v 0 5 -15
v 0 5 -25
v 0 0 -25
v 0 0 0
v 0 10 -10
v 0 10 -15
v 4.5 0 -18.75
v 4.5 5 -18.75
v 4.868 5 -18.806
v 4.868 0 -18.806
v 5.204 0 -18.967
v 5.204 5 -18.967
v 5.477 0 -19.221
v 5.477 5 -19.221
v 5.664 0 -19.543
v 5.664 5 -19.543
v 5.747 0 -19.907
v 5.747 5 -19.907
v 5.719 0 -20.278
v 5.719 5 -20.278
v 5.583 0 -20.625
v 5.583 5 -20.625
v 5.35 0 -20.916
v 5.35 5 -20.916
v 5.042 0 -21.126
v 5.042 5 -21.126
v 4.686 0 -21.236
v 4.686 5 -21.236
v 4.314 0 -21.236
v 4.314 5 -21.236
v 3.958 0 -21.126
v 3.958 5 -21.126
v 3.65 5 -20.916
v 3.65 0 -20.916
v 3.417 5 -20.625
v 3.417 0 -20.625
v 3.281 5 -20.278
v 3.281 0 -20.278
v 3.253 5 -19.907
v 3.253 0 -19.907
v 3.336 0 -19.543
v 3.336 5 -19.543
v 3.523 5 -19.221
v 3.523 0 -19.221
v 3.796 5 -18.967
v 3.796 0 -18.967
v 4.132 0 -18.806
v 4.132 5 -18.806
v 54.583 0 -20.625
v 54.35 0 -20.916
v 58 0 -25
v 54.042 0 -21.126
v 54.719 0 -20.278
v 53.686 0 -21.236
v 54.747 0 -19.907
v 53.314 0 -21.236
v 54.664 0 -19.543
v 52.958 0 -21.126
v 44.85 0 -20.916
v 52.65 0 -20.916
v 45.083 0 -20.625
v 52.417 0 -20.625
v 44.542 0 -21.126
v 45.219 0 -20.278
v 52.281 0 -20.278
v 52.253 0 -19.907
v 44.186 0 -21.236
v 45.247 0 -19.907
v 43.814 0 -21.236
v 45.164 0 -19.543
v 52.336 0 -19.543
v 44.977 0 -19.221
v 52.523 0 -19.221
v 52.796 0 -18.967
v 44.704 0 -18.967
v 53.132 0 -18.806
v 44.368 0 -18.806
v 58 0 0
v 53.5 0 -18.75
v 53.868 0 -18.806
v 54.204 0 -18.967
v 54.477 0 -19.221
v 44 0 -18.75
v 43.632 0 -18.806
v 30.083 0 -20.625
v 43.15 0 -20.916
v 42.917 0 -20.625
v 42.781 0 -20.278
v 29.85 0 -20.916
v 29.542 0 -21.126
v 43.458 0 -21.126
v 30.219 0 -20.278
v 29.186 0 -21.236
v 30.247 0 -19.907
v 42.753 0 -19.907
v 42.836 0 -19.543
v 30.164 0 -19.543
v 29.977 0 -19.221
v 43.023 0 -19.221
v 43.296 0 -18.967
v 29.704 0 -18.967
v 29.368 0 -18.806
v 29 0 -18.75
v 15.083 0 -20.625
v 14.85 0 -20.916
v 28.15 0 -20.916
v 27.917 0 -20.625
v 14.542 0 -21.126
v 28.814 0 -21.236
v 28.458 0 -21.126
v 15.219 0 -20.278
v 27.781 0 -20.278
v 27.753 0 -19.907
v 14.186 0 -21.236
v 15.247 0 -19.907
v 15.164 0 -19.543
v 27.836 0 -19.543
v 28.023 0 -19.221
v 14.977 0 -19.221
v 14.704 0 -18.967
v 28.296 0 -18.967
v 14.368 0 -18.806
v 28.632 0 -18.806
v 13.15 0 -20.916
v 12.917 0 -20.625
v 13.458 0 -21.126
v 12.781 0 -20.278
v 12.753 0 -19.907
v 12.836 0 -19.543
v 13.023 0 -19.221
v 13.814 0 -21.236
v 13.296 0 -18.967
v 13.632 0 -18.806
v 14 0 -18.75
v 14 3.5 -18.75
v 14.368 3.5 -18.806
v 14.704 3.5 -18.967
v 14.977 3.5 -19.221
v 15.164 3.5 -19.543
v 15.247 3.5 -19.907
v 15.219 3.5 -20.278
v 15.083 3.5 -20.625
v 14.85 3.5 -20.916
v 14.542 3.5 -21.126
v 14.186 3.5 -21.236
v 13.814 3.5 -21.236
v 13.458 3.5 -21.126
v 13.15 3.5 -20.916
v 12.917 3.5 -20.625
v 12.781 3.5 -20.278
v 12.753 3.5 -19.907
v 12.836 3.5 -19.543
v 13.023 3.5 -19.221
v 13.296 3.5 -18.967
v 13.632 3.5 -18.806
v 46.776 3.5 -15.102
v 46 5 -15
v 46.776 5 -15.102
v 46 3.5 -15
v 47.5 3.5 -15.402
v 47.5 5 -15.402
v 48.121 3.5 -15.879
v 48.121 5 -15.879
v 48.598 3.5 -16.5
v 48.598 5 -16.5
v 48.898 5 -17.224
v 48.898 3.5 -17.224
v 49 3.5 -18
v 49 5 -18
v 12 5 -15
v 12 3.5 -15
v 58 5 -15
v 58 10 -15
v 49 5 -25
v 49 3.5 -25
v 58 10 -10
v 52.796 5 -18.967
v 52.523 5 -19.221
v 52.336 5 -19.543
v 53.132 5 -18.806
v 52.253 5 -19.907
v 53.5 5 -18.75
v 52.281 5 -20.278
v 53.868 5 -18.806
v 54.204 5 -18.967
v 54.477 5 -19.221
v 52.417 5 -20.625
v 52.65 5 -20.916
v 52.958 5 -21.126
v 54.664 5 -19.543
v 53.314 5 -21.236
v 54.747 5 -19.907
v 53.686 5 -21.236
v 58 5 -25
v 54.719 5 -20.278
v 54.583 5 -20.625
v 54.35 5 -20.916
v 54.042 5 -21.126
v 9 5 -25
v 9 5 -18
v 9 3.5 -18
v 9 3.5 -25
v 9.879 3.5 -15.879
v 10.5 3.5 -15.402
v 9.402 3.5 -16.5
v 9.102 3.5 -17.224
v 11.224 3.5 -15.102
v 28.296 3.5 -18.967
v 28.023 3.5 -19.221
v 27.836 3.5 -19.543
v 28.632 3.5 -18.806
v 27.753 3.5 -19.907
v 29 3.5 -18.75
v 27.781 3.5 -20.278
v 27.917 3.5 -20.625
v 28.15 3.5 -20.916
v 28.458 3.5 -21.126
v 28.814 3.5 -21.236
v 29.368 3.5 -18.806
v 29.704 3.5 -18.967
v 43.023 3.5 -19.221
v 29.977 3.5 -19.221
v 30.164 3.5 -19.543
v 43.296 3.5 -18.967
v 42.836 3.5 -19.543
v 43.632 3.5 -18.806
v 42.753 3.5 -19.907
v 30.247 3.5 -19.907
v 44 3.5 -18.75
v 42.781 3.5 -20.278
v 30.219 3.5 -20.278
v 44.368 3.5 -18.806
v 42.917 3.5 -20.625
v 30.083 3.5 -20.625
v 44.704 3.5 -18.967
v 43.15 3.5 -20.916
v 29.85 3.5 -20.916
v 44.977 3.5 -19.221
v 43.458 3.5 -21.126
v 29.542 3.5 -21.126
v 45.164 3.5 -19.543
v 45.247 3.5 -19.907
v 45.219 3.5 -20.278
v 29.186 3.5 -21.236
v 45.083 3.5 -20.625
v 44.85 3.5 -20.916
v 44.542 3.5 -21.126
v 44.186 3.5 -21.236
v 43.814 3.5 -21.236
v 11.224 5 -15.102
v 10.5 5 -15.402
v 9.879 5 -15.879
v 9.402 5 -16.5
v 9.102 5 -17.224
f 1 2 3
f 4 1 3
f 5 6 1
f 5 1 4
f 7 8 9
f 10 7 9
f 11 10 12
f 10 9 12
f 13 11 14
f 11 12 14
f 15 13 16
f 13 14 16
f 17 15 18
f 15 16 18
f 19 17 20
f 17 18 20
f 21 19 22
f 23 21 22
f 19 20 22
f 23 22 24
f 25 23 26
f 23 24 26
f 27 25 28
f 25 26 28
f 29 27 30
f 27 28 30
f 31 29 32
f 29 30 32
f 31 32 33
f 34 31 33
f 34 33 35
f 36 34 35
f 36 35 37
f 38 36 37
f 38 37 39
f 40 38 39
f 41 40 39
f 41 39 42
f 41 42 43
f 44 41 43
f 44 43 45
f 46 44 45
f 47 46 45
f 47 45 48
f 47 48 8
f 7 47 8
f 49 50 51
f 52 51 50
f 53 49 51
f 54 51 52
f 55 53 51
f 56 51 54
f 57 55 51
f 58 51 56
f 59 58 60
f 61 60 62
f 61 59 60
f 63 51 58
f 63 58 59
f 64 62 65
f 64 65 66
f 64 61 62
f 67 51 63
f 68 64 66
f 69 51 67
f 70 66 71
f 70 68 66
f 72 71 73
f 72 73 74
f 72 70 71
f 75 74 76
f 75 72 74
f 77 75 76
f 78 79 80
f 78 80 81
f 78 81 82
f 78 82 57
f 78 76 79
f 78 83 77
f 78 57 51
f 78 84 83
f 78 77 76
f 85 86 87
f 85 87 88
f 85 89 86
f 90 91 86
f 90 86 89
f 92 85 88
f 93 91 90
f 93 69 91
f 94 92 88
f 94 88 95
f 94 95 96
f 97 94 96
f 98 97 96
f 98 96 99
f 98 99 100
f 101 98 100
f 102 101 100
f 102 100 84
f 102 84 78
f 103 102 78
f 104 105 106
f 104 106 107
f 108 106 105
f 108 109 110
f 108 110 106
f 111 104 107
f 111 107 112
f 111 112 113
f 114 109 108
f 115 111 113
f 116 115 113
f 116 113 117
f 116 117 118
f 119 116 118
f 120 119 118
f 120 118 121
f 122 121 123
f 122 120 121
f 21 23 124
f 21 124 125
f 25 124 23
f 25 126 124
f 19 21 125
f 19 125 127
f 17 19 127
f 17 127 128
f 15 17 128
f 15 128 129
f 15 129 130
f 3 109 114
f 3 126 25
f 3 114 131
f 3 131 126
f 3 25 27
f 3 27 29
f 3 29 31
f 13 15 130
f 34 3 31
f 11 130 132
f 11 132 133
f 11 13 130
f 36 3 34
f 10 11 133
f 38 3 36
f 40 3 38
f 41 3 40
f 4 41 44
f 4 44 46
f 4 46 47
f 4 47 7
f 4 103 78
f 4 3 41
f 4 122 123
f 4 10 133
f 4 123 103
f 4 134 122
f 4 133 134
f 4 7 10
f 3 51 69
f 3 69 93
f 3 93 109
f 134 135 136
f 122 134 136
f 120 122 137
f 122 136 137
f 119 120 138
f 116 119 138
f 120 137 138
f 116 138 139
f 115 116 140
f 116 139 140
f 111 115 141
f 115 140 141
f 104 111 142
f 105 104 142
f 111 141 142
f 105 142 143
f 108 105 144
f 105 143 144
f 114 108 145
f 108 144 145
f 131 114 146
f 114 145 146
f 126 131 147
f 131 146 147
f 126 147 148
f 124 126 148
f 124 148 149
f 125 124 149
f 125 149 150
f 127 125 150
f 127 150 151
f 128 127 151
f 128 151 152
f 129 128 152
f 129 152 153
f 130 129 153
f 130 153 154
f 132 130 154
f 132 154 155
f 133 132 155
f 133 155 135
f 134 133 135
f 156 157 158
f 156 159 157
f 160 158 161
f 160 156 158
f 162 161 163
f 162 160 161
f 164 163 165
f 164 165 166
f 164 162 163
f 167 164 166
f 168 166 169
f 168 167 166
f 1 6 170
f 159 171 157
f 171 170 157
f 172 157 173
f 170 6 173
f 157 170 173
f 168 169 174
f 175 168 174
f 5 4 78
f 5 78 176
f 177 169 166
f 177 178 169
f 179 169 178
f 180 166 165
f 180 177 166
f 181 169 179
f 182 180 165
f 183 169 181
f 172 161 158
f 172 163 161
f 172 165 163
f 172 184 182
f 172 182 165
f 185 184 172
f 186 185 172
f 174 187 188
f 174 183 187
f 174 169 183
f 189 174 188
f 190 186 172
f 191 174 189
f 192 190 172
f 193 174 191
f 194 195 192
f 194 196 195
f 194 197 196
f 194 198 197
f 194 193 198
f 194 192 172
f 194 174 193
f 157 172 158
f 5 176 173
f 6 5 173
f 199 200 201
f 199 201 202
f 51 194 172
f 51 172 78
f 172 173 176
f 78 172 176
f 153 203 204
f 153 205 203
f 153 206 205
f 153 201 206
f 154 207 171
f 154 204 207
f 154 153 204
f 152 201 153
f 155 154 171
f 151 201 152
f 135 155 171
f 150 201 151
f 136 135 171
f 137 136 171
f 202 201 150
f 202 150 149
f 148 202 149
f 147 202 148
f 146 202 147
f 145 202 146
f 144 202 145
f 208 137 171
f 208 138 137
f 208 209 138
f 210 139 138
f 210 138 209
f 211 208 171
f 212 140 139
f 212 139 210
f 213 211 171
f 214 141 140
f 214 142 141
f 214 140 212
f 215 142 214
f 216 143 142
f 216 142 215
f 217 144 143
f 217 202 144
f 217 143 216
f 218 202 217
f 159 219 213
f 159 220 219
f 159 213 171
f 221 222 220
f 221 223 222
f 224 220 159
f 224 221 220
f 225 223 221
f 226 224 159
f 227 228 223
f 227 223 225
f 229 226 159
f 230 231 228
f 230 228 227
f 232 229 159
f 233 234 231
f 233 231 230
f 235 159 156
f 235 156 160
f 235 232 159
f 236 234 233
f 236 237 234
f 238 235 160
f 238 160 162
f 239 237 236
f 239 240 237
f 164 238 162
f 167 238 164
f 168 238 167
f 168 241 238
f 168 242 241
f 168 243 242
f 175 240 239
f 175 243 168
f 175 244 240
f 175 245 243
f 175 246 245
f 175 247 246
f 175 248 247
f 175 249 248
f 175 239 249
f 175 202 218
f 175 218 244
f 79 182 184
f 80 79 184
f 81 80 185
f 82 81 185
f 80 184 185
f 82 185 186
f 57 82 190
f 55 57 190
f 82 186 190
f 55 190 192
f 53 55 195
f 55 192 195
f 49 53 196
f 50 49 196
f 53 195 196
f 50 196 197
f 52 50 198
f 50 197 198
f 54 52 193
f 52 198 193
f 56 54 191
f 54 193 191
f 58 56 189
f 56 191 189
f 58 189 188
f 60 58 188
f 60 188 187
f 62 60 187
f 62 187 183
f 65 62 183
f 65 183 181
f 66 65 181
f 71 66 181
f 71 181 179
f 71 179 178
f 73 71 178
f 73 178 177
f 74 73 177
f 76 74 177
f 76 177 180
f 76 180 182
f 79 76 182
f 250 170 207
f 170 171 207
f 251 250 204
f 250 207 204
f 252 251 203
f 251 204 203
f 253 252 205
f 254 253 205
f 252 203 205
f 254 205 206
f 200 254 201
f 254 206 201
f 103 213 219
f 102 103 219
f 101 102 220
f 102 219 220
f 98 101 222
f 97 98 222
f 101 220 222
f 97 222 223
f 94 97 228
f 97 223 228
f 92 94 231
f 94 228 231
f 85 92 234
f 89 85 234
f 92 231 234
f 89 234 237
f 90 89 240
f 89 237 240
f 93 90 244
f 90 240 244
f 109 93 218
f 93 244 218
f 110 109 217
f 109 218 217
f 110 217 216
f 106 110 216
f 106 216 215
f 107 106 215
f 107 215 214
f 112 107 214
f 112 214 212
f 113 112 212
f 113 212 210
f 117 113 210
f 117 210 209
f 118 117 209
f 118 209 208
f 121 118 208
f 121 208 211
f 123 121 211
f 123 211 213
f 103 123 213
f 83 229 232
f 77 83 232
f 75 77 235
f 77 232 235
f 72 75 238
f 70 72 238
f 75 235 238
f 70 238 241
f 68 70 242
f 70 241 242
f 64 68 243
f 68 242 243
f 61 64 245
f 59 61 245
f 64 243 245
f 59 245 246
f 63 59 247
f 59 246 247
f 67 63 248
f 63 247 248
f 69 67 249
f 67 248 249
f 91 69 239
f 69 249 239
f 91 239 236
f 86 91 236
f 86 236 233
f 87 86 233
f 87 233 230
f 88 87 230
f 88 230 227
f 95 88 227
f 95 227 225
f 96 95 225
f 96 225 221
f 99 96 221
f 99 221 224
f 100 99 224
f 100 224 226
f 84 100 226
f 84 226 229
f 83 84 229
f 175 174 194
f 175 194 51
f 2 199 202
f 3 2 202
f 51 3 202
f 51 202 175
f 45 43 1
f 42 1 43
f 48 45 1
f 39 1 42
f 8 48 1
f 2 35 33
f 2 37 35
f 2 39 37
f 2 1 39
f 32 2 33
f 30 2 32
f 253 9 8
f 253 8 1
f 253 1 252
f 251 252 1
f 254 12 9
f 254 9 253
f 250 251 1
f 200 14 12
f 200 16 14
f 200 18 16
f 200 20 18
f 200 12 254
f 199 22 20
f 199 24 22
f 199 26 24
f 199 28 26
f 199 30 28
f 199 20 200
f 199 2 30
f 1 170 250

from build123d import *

# Parameters (mm, degrees)
BOSS_EXTRUDE1_DEPTH = 58
SKETCH3_W           = 40
SKETCH3_H           = 10
CUT_EXTRUDE2_DEPTH  = 6.5
CUT_EXTRUDE3_REACH  = 65.492
SKETCH4_R           = 1.25
SKETCH5_W           = 58
SKETCH5_H           = 10
CUT_EXTRUDE4_DEPTH  = 5
CUT_EXTRUDE5_REACH  = 65.356
SKETCH6_R           = 1.25
FILLET1_R           = 3


with BuildPart() as part:
    # Sketch1 → Boss-Extrude1 (new body)
    with BuildSketch(Plane(origin=(0, 0, 0), x_dir=(0, 0, -1), z_dir=(1, 0, 0))):
        Polygon((0, 0), (10, 10), (25, 10), (25, 0), align=None)
    extrude(amount=BOSS_EXTRUDE1_DEPTH)

    # Sketch3 → Cut-Extrude2 (cut)
    with BuildSketch(Plane(origin=(0, 10, 0), x_dir=(1, 0, 0), z_dir=(0, 1, 0))):
        with Locations((29, 20)):
            Rectangle(SKETCH3_W, SKETCH3_H)
    extrude(amount=-CUT_EXTRUDE2_DEPTH, mode=Mode.SUBTRACT)

    # Sketch4 → Cut-Extrude3 (cut, up to next)
    with BuildSketch(Plane(origin=(0, 3.5, 0), x_dir=(1, 0, 0), z_dir=(0, 1, 0)), mode=Mode.PRIVATE) as cut_extrude3_sk1:
        with Locations(Location((14, 20, 0), (0, 0, 270))):
            Circle(SKETCH4_R)
    cut_extrude3_tool1 = extrude(cut_extrude3_sk1.sketch, amount=-CUT_EXTRUDE3_REACH, mode=Mode.PRIVATE) & part.part
    # Sketch4 → Cut-Extrude3 (cut, up to next)
    with BuildSketch(Plane(origin=(0, 3.5, 0), x_dir=(1, 0, 0), z_dir=(0, 1, 0)), mode=Mode.PRIVATE) as cut_extrude3_sk2:
        with Locations(Location((29, 20, 0), (0, 0, 270))):
            Circle(SKETCH4_R)
    cut_extrude3_tool2 = extrude(cut_extrude3_sk2.sketch, amount=-CUT_EXTRUDE3_REACH, mode=Mode.PRIVATE) & part.part
    # Sketch4 → Cut-Extrude3 (cut, up to next)
    with BuildSketch(Plane(origin=(0, 3.5, 0), x_dir=(1, 0, 0), z_dir=(0, 1, 0)), mode=Mode.PRIVATE) as cut_extrude3_sk3:
        with Locations(Location((44, 20, 0), (0, 0, 270))):
            Circle(SKETCH4_R)
    cut_extrude3_tool3 = extrude(cut_extrude3_sk3.sketch, amount=-CUT_EXTRUDE3_REACH, mode=Mode.PRIVATE) & part.part
    add(cut_extrude3_tool1.solids().sort_by_distance((14, 3.5, -20))[0], mode=Mode.SUBTRACT)
    add(cut_extrude3_tool2.solids().sort_by_distance((29, 3.5, -20))[0], mode=Mode.SUBTRACT)
    add(cut_extrude3_tool3.solids().sort_by_distance((44, 3.5, -20))[0], mode=Mode.SUBTRACT)

    # Sketch5 → Cut-Extrude4 (cut)
    with BuildSketch(Plane(origin=(0, 10, 0), x_dir=(1, 0, 0), z_dir=(0, 1, 0))):
        with Locations((29, 20)):
            Rectangle(SKETCH5_W, SKETCH5_H)
    extrude(amount=-CUT_EXTRUDE4_DEPTH, mode=Mode.SUBTRACT)

    # Sketch6 → Cut-Extrude5 (cut, up to next)
    with BuildSketch(Plane(origin=(0, 5, 0), x_dir=(1, 0, 0), z_dir=(0, 1, 0)), mode=Mode.PRIVATE) as cut_extrude5_sk1:
        with Locations(Location((4.5, 20, 0), (0, 0, 270))):
            Circle(SKETCH6_R)
    cut_extrude5_tool1 = extrude(cut_extrude5_sk1.sketch, amount=-CUT_EXTRUDE5_REACH, mode=Mode.PRIVATE) & part.part
    # Sketch6 → Cut-Extrude5 (cut, up to next)
    with BuildSketch(Plane(origin=(0, 5, 0), x_dir=(1, 0, 0), z_dir=(0, 1, 0)), mode=Mode.PRIVATE) as cut_extrude5_sk2:
        with Locations(Location((53.5, 20, 0), (0, 0, 270))):
            Circle(SKETCH6_R)
    cut_extrude5_tool2 = extrude(cut_extrude5_sk2.sketch, amount=-CUT_EXTRUDE5_REACH, mode=Mode.PRIVATE) & part.part
    add(cut_extrude5_tool1.solids().sort_by_distance((4.5, 5, -20))[0], mode=Mode.SUBTRACT)
    add(cut_extrude5_tool2.solids().sort_by_distance((53.5, 5, -20))[0], mode=Mode.SUBTRACT)

    # Fillet1
    fillet1_edges = [part.edges().sort_by_distance(p)[0] for p in [
        (9, 4.25, -15),
        (49, 4.25, -15),
    ]]
    fillet(fillet1_edges, radius=FILLET1_R)


solid = part.part
